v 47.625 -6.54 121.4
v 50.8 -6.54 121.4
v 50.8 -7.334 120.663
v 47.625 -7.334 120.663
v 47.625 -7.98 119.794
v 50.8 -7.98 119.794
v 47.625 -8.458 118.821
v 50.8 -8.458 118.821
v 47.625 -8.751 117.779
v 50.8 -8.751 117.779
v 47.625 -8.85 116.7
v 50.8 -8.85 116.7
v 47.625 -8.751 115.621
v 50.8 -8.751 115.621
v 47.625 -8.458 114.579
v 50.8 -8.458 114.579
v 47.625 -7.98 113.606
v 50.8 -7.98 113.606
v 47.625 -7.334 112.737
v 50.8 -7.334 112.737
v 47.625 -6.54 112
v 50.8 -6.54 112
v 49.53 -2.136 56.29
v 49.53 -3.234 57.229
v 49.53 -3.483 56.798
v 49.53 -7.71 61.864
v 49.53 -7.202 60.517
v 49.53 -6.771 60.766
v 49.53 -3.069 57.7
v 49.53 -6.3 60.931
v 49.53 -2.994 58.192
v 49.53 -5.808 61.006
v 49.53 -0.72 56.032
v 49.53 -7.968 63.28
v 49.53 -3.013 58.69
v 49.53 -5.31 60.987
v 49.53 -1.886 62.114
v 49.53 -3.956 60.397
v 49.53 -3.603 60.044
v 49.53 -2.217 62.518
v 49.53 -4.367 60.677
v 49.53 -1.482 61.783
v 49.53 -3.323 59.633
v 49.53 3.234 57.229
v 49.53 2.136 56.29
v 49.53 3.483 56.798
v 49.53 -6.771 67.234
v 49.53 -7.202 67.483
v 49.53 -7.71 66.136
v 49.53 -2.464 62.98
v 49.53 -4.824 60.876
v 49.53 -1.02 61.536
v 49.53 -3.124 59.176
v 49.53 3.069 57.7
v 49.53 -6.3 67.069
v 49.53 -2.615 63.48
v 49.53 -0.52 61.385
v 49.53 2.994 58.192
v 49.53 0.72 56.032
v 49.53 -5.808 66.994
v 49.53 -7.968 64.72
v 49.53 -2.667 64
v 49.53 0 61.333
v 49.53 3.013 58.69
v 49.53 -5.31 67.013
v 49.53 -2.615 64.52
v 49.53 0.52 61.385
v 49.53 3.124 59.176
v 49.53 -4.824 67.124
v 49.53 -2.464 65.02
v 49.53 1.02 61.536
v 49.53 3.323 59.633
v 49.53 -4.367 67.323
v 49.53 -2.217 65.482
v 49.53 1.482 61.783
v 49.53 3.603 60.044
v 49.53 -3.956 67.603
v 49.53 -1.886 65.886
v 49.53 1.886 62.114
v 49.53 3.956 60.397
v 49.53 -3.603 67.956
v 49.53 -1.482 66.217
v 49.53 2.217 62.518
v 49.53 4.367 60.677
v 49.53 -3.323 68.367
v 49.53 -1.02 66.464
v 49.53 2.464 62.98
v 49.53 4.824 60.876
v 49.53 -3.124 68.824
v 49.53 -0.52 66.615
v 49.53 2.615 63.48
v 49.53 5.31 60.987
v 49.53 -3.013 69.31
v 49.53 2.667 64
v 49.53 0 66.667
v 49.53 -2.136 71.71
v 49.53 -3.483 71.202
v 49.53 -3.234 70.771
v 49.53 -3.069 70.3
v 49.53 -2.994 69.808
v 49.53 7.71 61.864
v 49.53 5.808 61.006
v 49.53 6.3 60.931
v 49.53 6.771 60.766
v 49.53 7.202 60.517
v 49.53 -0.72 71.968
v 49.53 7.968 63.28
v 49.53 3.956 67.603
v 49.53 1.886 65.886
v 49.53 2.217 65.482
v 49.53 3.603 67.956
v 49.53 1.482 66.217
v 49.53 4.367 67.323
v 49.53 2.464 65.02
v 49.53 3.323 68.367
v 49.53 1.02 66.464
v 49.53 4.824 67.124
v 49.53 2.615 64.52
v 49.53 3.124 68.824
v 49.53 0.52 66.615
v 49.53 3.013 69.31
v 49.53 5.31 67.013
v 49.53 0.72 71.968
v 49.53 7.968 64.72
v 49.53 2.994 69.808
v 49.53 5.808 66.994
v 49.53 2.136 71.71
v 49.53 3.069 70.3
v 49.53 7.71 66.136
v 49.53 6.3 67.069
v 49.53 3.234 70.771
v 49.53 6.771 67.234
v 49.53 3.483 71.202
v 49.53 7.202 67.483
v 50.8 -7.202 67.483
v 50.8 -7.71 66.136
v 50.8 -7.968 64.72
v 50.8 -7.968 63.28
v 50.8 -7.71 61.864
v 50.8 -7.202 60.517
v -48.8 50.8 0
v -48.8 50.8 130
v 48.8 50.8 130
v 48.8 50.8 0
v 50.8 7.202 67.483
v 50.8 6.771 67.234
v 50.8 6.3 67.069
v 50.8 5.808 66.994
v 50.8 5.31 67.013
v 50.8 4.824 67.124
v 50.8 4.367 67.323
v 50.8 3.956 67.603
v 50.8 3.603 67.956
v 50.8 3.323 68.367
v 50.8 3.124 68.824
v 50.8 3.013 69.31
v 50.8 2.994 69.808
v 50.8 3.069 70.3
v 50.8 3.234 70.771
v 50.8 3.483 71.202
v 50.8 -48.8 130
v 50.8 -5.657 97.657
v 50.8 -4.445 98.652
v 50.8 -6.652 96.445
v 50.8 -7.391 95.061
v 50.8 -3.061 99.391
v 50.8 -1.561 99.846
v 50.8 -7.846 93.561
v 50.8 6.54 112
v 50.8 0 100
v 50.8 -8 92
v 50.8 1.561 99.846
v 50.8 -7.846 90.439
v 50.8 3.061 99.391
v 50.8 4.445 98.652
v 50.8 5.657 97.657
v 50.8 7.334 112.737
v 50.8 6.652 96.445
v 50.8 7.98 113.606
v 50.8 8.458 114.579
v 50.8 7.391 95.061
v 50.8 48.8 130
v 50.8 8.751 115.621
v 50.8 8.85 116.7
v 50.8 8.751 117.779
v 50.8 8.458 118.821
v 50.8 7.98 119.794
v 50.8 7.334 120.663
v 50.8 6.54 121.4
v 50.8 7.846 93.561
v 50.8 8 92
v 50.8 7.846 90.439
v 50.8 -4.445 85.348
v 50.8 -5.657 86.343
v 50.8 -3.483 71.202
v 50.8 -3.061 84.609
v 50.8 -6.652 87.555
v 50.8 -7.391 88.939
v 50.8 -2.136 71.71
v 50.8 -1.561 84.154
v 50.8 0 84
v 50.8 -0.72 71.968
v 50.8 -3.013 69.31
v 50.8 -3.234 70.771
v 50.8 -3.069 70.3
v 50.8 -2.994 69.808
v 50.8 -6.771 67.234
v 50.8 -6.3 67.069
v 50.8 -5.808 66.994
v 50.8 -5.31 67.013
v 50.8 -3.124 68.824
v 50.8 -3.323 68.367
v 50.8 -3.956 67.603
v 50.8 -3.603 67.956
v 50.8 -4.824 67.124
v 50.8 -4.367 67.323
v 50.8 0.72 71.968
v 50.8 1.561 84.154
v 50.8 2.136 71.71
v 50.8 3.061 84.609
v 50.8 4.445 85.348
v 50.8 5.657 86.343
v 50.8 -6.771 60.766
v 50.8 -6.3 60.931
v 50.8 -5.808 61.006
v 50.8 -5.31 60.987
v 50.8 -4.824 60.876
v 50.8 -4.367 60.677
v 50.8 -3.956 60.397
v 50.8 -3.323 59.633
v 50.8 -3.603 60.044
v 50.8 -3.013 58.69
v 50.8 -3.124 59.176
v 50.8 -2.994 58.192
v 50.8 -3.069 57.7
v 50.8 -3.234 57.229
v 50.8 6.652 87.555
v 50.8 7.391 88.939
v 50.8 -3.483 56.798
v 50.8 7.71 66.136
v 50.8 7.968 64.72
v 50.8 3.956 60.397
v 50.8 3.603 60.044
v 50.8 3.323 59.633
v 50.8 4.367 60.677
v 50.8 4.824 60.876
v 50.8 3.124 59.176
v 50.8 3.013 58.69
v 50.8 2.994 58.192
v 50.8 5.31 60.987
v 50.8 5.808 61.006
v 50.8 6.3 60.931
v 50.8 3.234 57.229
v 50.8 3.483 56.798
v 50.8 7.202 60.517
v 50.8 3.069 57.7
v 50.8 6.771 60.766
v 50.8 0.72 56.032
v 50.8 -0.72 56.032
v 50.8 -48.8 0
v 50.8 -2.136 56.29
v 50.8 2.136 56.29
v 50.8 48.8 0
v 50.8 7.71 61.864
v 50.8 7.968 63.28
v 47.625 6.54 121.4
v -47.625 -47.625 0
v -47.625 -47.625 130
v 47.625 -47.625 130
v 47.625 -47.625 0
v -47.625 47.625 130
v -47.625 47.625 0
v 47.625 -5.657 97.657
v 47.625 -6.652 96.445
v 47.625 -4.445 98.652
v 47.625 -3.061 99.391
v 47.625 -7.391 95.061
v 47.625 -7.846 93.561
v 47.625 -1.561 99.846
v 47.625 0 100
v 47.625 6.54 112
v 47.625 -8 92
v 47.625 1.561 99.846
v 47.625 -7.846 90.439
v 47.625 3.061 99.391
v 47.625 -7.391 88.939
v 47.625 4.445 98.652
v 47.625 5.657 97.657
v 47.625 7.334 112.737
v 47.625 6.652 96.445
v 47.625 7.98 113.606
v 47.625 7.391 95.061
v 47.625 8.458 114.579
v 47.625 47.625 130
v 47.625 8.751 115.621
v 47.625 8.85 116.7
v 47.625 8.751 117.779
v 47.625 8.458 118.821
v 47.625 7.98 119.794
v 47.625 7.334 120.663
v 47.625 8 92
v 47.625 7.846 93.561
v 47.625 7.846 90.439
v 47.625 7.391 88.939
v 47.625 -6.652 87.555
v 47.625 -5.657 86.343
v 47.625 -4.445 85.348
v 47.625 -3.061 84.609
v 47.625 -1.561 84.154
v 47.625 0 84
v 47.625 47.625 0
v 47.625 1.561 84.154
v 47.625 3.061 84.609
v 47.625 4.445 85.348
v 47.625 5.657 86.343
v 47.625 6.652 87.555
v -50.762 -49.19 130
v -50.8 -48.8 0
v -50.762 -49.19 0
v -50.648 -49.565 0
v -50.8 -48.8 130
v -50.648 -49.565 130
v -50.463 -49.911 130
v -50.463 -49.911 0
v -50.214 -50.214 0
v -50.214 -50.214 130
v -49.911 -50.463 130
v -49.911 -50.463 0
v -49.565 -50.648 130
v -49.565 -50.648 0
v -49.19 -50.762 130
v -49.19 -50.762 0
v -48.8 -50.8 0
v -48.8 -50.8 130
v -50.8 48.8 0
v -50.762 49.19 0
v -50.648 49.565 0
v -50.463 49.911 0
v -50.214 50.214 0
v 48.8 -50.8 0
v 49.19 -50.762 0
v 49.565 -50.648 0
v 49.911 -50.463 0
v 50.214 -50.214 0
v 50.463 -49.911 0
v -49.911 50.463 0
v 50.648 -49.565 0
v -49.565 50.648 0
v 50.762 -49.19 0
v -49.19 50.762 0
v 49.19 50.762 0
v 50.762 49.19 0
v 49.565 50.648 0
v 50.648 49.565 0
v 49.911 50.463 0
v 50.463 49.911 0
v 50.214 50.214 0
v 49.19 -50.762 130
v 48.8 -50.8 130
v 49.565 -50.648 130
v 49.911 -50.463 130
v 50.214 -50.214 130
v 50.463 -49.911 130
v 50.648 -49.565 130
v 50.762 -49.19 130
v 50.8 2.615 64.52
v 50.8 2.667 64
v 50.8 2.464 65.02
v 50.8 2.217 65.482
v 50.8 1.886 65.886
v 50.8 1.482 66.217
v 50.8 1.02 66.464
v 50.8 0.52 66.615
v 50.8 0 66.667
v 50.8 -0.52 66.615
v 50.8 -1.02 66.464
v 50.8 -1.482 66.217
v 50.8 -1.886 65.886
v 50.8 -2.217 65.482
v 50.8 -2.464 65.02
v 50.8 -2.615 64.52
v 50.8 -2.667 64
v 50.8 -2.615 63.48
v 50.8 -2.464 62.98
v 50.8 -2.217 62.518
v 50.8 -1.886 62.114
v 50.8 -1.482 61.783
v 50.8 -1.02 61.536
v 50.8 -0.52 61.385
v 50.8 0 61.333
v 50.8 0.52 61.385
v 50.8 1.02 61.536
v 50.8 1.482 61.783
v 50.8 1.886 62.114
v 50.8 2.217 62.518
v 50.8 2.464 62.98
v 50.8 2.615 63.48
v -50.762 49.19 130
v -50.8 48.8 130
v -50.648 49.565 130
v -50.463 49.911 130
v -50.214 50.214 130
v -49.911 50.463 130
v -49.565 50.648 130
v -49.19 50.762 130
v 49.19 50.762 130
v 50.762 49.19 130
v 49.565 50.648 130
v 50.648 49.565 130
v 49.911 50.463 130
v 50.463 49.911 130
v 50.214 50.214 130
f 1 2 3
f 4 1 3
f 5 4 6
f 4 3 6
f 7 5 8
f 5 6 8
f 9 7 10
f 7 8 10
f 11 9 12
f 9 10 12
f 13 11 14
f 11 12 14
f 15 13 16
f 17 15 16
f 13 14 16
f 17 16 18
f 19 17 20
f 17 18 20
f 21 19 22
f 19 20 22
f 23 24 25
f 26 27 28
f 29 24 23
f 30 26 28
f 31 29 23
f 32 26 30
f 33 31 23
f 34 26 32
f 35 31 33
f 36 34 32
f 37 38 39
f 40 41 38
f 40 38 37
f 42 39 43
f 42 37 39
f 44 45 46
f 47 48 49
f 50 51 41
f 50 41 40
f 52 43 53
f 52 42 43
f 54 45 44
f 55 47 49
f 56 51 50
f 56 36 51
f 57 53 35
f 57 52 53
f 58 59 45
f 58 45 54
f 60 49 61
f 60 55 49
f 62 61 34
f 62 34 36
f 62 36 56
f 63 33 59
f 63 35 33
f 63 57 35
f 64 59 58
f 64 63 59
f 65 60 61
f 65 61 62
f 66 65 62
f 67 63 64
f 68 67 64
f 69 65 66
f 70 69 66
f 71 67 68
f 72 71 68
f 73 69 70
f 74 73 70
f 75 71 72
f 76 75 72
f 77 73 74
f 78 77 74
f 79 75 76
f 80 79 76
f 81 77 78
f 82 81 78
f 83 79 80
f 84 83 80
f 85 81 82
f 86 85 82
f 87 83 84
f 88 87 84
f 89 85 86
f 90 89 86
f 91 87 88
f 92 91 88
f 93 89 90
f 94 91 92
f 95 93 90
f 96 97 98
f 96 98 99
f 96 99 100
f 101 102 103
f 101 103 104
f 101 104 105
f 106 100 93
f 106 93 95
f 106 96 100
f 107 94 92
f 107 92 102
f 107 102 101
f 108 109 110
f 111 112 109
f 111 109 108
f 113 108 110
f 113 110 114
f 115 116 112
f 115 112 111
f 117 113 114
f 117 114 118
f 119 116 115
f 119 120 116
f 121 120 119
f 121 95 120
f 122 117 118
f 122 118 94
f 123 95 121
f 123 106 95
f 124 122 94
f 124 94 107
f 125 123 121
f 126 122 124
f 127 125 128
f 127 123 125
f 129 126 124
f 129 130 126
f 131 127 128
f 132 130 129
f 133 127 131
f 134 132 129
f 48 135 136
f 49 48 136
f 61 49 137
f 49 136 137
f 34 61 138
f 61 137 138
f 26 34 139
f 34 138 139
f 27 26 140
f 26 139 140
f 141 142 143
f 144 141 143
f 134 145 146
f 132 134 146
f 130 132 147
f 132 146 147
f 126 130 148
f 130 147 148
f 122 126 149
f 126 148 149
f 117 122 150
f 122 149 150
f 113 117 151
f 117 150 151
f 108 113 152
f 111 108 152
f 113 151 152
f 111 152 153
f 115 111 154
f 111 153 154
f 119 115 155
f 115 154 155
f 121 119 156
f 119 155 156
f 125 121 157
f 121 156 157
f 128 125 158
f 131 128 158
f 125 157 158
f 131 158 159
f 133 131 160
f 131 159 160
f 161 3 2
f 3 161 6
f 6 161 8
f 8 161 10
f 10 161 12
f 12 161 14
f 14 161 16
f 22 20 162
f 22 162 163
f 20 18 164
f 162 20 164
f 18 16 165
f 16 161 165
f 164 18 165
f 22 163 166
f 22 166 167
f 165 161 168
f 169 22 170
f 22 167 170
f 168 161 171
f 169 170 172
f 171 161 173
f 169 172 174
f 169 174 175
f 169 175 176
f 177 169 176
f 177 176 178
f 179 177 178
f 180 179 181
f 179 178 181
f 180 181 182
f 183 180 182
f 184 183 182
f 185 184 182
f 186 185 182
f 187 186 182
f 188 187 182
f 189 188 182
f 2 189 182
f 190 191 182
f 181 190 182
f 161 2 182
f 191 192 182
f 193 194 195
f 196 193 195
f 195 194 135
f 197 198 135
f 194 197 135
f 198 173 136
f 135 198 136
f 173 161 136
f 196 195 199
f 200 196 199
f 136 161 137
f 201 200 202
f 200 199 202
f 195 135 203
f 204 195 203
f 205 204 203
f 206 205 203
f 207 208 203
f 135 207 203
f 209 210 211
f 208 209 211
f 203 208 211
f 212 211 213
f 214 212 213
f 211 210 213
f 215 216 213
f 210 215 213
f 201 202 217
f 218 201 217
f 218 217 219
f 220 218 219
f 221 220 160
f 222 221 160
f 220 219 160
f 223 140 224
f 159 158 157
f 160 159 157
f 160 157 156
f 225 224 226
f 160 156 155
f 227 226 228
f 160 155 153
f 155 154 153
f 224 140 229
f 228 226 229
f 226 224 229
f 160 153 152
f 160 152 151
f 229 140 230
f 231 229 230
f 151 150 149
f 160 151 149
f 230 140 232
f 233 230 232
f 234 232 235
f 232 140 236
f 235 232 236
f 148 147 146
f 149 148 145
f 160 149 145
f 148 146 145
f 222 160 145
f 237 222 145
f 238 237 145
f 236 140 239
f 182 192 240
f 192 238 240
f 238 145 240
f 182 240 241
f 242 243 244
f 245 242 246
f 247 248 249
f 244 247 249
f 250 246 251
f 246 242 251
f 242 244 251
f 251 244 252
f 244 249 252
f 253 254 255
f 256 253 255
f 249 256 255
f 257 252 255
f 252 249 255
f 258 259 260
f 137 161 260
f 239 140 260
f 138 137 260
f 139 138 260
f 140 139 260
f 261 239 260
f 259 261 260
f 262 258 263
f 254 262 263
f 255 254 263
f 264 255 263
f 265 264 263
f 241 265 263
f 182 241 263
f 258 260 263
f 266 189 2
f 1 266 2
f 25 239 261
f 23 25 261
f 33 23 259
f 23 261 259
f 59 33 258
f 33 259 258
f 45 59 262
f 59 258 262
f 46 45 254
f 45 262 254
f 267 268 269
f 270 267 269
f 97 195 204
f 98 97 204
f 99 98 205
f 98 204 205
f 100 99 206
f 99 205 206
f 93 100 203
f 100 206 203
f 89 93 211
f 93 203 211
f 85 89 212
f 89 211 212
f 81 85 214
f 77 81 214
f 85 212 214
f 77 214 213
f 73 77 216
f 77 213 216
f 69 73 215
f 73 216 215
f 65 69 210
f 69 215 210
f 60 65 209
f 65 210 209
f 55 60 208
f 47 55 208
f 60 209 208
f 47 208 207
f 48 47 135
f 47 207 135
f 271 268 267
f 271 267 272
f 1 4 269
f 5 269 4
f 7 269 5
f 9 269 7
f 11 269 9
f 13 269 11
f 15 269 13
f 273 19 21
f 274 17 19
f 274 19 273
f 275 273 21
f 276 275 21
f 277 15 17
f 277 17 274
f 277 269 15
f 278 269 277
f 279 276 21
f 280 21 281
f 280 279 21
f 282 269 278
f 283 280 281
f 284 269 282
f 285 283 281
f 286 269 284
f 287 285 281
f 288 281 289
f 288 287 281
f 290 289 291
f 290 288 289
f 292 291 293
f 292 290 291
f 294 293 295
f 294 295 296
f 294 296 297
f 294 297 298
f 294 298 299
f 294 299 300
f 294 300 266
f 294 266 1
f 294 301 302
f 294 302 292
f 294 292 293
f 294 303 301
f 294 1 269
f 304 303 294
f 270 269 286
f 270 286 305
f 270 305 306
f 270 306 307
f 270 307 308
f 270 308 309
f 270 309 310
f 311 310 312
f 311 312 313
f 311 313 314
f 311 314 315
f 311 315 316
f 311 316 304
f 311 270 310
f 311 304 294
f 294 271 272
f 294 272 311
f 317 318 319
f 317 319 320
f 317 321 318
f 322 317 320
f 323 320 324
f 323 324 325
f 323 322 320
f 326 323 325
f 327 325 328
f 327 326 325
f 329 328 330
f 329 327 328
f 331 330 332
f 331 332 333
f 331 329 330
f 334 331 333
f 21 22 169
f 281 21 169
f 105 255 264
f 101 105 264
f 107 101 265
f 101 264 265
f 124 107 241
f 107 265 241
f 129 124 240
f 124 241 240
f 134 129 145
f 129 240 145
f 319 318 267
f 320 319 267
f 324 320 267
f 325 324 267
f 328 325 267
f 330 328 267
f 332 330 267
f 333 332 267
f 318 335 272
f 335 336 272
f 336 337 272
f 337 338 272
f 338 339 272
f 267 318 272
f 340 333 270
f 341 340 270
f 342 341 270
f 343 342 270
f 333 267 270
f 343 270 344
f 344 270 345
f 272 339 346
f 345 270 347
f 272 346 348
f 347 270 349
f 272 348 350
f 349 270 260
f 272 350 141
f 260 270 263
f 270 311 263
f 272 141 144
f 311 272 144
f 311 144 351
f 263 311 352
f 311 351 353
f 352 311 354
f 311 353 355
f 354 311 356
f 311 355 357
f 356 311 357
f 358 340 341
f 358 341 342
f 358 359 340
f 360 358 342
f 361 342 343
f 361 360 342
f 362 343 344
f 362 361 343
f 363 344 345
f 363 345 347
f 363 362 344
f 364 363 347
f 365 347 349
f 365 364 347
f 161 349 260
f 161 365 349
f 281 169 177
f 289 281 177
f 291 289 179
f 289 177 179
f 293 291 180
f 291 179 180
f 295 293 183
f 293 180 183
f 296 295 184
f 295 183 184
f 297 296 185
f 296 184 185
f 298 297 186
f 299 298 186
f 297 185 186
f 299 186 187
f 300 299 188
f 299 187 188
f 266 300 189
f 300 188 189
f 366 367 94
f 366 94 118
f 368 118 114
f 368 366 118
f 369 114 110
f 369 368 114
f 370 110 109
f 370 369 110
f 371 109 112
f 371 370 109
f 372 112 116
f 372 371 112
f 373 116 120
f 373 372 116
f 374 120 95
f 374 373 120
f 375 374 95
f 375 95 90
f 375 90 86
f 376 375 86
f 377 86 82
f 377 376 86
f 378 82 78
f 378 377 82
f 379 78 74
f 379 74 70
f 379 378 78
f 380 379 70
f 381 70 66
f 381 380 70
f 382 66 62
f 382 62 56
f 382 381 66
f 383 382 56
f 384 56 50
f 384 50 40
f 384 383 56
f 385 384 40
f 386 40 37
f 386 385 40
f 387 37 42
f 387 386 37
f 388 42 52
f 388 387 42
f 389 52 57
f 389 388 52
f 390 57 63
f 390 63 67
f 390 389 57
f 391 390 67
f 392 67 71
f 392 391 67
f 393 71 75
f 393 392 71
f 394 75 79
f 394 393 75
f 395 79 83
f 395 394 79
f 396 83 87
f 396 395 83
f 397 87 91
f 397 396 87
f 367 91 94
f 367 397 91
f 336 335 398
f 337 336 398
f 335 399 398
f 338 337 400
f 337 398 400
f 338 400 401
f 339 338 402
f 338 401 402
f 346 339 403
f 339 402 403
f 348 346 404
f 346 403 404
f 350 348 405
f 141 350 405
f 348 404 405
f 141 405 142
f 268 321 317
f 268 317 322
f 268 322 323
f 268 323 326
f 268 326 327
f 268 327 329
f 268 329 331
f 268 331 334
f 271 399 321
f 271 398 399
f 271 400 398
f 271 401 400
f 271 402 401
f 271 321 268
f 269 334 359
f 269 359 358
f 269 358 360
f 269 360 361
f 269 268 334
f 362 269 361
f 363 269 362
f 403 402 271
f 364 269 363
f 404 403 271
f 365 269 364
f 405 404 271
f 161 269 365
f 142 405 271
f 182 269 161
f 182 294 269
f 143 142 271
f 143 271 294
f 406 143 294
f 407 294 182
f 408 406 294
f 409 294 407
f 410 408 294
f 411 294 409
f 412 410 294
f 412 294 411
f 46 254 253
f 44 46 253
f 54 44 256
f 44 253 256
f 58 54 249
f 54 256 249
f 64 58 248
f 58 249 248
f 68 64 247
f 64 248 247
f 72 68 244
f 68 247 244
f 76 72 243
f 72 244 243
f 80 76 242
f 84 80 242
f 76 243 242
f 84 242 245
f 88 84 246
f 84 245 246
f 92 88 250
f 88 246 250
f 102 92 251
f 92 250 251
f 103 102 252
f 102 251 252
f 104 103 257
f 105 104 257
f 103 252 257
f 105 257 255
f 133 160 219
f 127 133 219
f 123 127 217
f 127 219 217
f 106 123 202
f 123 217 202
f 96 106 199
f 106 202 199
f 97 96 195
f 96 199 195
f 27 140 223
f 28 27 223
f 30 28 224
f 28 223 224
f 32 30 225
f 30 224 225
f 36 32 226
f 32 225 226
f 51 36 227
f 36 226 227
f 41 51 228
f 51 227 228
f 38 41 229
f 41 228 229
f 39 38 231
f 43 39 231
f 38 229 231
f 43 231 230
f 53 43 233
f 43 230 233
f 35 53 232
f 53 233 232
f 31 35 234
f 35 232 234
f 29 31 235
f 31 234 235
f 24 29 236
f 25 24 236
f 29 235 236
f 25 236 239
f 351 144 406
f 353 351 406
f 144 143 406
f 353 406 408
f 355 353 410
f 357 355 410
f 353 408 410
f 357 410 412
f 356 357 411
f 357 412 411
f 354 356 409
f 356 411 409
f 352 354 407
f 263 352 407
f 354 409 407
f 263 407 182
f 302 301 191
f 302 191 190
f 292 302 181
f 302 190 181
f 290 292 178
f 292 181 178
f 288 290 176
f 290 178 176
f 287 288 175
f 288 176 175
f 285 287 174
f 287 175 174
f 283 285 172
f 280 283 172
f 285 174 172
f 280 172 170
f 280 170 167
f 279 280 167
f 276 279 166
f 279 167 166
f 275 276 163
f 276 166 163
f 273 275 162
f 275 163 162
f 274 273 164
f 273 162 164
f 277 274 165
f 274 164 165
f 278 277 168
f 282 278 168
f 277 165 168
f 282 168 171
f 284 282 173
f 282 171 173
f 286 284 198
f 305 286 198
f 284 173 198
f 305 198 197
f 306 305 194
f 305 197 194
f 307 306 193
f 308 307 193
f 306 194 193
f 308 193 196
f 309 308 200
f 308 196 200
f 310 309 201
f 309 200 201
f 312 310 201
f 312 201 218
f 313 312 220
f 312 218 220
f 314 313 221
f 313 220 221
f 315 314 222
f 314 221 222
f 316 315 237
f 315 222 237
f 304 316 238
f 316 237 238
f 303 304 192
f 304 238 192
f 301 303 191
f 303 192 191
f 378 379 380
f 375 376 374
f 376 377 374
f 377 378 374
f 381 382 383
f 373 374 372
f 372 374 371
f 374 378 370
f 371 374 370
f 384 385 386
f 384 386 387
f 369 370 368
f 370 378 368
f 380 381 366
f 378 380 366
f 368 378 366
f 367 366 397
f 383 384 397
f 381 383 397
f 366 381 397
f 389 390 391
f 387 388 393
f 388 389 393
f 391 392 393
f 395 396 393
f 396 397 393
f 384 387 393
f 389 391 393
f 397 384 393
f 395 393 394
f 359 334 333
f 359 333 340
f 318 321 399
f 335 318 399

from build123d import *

# Parameters (mm, degrees)
F0_W     = 101.6
F0_H     = 101.6
F0_W_2   = 95.25
F0_H_2   = 95.25
F1_DEPTH = 130
F2_R     = 2
F3_W     = 6.54
F3_H     = 9.4
F4_DEPTH = 3.175
F5_R     = 2.6666666667
F6_DEPTH = 1.27


# Not quite as in the source:
# - a length typed as a fraction of an inch, garbled in the dataset ("3 / 203.2 mm" for 3/8 in), is restored


with BuildPart() as f1:
    # F0 (on Top) → F1 (new body)
    with BuildSketch(Plane.XY):
        Rectangle(F0_W, F0_H)
        Rectangle(F0_W_2, F0_H_2, mode=Mode.SUBTRACT)
    extrude(amount=F1_DEPTH)

    # F2
    f2_edges = [f1.edges().sort_by_distance(p)[0] for p in [
        (50.8, 50.8, 65),
        (-50.8, 50.8, 65),
        (50.8, -50.8, 65),
        (-50.8, -50.8, 65),
    ]]
    fillet(f2_edges, radius=F2_R)

    # F3 (on face) → F4 (cut)
    with BuildSketch(Plane.YZ.offset(50.8)):
        with Locations((-3.27, 116.7)):
            Rectangle(F3_W, F3_H)
        with BuildLine():
            Line((-6.54, 112), (-6.54, 121.4))
            ThreePointArc((-6.54, 121.4), (-8.85, 116.7), (-6.54, 112))
        make_face()
        with Locations((3.27, 116.7)):
            Rectangle(F3_W, F3_H)
        with BuildLine():
            ThreePointArc((6.54, 112), (8.85, 116.7), (6.54, 121.4))
            Line((6.54, 121.4), (6.54, 112))
        make_face()
        with BuildLine():
            Line((0, 84), (0, 100))
            ThreePointArc((0, 100), (-8, 92), (0, 84))
        make_face()
        with BuildLine():
            ThreePointArc((8, 92), (5.6568542495, 97.6568542495), (0, 100))
            Line((0, 100), (0, 84))
            ThreePointArc((0, 84), (5.6568542495, 86.3431457505), (8, 92))
        make_face()
    extrude(amount=-F4_DEPTH, mode=Mode.SUBTRACT)

    # F5 (on face) → F6 (cut)
    with BuildSketch(Plane.YZ.offset(50.8)):
        with BuildLine():
            Line((0, 84), (0, 100))
            ThreePointArc((0, 100), (-8, 92), (0, 84))
        make_face()
        with BuildLine():
            ThreePointArc((8, 92), (5.6568542495, 97.6568542495), (0, 100))
            Line((0, 100), (0, 84))
            ThreePointArc((0, 84), (5.6568542495, 86.3431457505), (8, 92))
        make_face()
        with BuildLine():
            ThreePointArc((-3.4833400656, 71.2018290724), (-3.7712361663, 67.7712361663), (-7.2018290724, 67.4833400656))
            ThreePointArc((-7.2018290724, 67.4833400656), (-8, 64), (-7.2018290724, 60.5166599344))
            ThreePointArc((-7.2018290724, 60.5166599344), (-3.7712361663, 60.2287638337), (-3.4833400656, 56.7981709276))
            ThreePointArc((-3.4833400656, 56.7981709276), (0, 56), (3.4833400656, 56.7981709276))
            ThreePointArc((3.4833400656, 56.7981709276), (3.7712361663, 60.2287638337), (7.2018290724, 60.5166599344))
            ThreePointArc((7.2018290724, 60.5166599344), (8, 64), (7.2018290724, 67.4833400656))
            ThreePointArc((7.2018290724, 67.4833400656), (3.7712361663, 67.7712361663), (3.4833400656, 71.2018290724))
            ThreePointArc((3.4833400656, 71.2018290724), (0, 72), (-3.4833400656, 71.2018290724))
        make_face()
        with Locations((0, 64)):
            Circle(F5_R, mode=Mode.SUBTRACT)
    extrude(amount=-F6_DEPTH, mode=Mode.SUBTRACT)


solid = f1.part
